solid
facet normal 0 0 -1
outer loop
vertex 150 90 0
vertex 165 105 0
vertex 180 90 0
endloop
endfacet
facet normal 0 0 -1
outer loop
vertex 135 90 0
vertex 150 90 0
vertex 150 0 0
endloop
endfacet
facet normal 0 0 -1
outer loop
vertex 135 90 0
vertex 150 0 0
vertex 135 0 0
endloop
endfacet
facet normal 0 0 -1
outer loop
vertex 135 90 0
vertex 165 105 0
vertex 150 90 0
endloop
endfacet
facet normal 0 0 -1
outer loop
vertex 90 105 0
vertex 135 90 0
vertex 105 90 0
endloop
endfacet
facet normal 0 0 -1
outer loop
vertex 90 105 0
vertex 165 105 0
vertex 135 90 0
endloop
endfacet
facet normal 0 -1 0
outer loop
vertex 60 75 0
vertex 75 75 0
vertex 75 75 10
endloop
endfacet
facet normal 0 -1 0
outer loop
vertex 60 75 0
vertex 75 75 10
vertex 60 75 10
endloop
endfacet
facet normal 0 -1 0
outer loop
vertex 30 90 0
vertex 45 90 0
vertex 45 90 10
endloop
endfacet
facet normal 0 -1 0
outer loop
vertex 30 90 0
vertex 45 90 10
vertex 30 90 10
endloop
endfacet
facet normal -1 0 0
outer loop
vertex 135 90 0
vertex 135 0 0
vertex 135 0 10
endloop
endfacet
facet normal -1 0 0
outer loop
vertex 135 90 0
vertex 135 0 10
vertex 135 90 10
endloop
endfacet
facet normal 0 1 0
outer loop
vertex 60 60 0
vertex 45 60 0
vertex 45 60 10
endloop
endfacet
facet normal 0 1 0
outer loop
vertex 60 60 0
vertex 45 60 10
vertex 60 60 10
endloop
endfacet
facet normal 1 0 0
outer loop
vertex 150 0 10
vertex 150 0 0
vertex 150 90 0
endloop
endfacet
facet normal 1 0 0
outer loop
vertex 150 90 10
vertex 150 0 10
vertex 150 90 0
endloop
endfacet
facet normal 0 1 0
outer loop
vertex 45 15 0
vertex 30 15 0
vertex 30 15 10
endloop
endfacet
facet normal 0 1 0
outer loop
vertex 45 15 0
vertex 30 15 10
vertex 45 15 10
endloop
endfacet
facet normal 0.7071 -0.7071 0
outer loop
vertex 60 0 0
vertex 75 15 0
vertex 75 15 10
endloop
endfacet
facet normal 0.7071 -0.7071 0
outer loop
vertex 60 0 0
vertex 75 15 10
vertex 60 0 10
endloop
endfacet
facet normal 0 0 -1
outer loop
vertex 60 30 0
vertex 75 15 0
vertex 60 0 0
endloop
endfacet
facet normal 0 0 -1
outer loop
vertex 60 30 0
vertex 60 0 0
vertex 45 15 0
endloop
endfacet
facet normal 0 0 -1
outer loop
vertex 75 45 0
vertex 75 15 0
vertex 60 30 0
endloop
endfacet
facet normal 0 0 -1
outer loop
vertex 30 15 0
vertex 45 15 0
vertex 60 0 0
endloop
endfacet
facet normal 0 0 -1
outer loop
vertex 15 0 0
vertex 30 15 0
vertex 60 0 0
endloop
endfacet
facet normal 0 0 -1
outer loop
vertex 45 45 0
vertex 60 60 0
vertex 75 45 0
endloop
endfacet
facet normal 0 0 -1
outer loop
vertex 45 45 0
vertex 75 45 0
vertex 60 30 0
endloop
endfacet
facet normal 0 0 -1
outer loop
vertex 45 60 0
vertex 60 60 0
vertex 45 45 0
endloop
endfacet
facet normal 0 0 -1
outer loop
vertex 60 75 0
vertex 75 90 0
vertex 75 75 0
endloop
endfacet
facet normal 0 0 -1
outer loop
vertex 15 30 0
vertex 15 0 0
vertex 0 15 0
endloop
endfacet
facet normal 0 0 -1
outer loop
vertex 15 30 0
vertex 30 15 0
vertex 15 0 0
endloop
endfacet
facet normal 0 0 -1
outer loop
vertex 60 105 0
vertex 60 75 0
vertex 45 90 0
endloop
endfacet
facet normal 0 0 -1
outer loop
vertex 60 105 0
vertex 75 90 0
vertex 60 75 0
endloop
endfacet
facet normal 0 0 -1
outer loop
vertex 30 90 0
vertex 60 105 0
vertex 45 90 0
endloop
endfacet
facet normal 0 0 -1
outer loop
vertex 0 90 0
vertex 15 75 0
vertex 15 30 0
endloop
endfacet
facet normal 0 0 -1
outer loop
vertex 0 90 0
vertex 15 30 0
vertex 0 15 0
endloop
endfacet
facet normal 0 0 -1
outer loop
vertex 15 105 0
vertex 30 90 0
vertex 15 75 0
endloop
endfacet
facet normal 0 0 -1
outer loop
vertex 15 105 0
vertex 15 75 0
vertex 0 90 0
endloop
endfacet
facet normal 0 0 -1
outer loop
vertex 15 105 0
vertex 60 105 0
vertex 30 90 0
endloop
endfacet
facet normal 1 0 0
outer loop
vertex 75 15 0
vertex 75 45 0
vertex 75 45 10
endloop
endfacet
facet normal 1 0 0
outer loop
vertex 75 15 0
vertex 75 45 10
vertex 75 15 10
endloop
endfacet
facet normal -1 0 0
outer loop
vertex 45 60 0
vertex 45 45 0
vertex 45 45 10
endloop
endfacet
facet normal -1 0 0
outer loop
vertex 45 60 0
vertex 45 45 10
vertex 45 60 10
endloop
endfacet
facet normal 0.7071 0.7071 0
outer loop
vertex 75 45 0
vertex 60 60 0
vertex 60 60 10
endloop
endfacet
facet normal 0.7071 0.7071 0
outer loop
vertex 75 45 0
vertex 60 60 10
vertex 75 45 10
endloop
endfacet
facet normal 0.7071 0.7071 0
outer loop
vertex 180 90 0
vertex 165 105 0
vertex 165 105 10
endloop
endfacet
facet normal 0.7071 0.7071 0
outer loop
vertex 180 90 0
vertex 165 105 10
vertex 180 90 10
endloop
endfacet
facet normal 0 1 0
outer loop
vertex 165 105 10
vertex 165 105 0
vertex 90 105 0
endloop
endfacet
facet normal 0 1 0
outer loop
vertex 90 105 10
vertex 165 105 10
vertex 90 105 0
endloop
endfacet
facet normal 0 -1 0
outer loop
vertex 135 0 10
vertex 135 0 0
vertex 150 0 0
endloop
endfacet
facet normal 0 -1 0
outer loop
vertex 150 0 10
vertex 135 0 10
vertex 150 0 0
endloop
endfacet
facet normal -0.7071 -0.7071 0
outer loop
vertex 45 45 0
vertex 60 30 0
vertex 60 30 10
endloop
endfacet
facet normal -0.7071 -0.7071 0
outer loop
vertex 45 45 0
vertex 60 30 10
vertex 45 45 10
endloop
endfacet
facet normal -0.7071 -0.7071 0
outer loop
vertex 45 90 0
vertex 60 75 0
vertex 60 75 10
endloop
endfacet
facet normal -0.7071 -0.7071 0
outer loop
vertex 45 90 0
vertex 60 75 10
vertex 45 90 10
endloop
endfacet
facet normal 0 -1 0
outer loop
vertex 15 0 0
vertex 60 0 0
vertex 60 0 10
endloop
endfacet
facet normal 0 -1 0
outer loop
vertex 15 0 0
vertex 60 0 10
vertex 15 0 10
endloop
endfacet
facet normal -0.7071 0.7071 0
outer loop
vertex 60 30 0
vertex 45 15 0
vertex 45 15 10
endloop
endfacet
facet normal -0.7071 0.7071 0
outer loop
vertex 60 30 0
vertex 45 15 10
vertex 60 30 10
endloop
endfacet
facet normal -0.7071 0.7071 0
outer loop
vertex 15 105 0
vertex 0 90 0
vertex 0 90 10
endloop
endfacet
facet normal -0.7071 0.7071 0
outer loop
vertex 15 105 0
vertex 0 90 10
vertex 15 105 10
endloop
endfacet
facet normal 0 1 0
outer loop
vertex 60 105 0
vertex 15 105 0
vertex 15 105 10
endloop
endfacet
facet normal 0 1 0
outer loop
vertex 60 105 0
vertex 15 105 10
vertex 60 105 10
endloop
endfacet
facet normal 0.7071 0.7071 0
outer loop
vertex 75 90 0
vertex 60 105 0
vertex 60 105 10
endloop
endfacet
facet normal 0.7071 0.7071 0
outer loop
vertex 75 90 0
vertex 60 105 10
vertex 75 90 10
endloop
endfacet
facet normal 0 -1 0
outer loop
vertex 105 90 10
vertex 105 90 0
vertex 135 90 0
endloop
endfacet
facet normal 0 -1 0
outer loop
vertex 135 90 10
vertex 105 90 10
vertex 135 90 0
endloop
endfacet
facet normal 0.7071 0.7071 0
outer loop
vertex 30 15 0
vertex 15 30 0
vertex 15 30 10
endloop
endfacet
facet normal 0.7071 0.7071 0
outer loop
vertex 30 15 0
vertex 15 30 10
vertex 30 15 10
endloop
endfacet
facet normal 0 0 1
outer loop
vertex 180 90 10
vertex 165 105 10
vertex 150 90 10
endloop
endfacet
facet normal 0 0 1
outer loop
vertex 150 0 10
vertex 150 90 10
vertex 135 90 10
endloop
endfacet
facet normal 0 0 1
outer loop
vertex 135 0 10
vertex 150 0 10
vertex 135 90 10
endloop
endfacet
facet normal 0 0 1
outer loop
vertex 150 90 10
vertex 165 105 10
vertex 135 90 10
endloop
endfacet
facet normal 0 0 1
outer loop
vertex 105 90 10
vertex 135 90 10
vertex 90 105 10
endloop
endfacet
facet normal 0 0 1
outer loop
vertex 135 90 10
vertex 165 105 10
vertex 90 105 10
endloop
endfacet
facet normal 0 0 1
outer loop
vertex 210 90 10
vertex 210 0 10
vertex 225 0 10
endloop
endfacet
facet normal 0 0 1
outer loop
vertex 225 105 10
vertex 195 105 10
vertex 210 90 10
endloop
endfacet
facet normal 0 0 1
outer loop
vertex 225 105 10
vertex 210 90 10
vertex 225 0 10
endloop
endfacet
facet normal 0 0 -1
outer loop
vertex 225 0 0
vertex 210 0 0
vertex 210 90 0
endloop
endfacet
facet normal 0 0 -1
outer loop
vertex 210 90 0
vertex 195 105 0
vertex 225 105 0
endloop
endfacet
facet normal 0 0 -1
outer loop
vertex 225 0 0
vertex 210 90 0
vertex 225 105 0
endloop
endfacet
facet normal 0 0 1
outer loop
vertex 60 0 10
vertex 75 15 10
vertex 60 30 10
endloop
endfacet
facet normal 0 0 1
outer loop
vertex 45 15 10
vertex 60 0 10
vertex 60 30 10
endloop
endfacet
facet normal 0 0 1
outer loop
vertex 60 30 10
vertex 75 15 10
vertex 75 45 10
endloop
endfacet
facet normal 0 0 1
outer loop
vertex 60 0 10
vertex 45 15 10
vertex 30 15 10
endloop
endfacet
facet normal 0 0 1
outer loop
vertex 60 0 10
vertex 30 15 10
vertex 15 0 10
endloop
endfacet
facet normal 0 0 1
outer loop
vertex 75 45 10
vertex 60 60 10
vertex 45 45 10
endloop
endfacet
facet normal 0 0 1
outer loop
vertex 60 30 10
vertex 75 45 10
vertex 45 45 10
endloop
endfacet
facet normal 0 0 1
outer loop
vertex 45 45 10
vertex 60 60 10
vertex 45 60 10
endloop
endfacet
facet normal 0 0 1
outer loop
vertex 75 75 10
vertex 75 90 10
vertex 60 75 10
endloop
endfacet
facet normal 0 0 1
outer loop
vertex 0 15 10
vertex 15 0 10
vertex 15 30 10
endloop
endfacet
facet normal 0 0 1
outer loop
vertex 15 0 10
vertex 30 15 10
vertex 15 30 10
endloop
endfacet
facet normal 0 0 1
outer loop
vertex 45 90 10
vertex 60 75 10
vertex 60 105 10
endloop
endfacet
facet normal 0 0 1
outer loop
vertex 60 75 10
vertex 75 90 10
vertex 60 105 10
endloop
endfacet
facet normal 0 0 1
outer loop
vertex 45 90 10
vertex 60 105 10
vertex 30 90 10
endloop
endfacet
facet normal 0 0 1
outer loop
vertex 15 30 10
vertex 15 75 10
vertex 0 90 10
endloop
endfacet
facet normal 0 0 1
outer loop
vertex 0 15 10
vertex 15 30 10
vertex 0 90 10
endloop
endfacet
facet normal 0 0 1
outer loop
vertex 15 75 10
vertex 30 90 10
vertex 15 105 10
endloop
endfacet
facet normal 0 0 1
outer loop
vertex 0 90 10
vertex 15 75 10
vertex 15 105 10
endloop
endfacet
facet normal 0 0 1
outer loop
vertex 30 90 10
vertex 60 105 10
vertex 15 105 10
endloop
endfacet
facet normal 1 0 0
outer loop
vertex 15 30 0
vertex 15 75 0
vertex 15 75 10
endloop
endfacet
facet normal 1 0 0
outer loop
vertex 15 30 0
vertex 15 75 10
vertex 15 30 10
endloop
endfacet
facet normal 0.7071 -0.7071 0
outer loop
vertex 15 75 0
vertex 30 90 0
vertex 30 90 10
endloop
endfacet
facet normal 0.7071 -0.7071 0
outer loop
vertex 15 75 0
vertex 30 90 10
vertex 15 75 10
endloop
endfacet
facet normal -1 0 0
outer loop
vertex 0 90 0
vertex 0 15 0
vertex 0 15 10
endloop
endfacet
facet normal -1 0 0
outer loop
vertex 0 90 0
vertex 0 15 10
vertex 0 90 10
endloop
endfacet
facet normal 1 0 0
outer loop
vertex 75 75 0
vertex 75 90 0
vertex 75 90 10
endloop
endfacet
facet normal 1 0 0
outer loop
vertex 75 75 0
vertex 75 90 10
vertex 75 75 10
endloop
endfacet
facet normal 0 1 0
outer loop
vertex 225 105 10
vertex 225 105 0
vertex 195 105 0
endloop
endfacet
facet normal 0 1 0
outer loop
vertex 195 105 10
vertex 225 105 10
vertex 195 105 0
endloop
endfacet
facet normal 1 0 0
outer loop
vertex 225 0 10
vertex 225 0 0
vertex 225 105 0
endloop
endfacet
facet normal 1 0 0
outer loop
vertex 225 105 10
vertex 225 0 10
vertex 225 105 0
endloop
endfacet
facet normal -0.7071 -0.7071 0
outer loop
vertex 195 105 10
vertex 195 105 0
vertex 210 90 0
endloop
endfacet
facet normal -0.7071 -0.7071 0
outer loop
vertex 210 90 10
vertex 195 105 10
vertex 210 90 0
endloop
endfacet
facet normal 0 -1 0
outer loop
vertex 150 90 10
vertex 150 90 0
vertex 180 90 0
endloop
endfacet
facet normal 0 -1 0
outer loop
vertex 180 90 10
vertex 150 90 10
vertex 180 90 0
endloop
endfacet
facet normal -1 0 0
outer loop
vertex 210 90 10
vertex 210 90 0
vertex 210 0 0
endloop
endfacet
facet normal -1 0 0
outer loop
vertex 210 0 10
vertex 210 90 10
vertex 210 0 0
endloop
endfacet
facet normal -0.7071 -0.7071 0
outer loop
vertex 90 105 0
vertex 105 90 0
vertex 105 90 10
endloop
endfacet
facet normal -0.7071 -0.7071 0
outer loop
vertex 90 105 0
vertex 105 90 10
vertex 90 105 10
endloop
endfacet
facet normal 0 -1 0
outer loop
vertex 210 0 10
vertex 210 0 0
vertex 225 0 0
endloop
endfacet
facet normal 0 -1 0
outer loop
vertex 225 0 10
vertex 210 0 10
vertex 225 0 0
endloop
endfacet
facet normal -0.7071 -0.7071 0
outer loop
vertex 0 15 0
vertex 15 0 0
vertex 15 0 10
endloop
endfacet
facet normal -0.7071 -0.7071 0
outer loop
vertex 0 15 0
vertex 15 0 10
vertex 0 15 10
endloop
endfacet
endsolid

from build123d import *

# Parameters (mm, degrees)
SKETCH2_W      = 15
SKETCH2_H      = 90
EXTRUDE1_DEPTH = 10


with BuildPart() as part:
    # Sketch2 → Extrude1 (new body)
    with BuildSketch(Plane.XY):
        Polygon((75, 15), (60, 0), (15, 0), (0, 15), (0, 90), (15, 105), (60, 105), (75, 90), (75, 75), (60, 75), (45, 90), (30, 90), (15, 75), (15, 30), (30, 15), (45, 15), (60, 30), (45, 45), (45, 60), (60, 60), (75, 45), align=None)
        Polygon((180, 90), (165, 90), (135, 90), (120, 90), (105, 90), (90, 105), (150, 105), (165, 105), align=None)
        Polygon((225, 0), (225, 105), (195, 105), (210, 90), (210, 0), align=None)
        with Locations((142.5, 45)):
            Rectangle(SKETCH2_W, SKETCH2_H)
    extrude(amount=EXTRUDE1_DEPTH)


solid = part.part
